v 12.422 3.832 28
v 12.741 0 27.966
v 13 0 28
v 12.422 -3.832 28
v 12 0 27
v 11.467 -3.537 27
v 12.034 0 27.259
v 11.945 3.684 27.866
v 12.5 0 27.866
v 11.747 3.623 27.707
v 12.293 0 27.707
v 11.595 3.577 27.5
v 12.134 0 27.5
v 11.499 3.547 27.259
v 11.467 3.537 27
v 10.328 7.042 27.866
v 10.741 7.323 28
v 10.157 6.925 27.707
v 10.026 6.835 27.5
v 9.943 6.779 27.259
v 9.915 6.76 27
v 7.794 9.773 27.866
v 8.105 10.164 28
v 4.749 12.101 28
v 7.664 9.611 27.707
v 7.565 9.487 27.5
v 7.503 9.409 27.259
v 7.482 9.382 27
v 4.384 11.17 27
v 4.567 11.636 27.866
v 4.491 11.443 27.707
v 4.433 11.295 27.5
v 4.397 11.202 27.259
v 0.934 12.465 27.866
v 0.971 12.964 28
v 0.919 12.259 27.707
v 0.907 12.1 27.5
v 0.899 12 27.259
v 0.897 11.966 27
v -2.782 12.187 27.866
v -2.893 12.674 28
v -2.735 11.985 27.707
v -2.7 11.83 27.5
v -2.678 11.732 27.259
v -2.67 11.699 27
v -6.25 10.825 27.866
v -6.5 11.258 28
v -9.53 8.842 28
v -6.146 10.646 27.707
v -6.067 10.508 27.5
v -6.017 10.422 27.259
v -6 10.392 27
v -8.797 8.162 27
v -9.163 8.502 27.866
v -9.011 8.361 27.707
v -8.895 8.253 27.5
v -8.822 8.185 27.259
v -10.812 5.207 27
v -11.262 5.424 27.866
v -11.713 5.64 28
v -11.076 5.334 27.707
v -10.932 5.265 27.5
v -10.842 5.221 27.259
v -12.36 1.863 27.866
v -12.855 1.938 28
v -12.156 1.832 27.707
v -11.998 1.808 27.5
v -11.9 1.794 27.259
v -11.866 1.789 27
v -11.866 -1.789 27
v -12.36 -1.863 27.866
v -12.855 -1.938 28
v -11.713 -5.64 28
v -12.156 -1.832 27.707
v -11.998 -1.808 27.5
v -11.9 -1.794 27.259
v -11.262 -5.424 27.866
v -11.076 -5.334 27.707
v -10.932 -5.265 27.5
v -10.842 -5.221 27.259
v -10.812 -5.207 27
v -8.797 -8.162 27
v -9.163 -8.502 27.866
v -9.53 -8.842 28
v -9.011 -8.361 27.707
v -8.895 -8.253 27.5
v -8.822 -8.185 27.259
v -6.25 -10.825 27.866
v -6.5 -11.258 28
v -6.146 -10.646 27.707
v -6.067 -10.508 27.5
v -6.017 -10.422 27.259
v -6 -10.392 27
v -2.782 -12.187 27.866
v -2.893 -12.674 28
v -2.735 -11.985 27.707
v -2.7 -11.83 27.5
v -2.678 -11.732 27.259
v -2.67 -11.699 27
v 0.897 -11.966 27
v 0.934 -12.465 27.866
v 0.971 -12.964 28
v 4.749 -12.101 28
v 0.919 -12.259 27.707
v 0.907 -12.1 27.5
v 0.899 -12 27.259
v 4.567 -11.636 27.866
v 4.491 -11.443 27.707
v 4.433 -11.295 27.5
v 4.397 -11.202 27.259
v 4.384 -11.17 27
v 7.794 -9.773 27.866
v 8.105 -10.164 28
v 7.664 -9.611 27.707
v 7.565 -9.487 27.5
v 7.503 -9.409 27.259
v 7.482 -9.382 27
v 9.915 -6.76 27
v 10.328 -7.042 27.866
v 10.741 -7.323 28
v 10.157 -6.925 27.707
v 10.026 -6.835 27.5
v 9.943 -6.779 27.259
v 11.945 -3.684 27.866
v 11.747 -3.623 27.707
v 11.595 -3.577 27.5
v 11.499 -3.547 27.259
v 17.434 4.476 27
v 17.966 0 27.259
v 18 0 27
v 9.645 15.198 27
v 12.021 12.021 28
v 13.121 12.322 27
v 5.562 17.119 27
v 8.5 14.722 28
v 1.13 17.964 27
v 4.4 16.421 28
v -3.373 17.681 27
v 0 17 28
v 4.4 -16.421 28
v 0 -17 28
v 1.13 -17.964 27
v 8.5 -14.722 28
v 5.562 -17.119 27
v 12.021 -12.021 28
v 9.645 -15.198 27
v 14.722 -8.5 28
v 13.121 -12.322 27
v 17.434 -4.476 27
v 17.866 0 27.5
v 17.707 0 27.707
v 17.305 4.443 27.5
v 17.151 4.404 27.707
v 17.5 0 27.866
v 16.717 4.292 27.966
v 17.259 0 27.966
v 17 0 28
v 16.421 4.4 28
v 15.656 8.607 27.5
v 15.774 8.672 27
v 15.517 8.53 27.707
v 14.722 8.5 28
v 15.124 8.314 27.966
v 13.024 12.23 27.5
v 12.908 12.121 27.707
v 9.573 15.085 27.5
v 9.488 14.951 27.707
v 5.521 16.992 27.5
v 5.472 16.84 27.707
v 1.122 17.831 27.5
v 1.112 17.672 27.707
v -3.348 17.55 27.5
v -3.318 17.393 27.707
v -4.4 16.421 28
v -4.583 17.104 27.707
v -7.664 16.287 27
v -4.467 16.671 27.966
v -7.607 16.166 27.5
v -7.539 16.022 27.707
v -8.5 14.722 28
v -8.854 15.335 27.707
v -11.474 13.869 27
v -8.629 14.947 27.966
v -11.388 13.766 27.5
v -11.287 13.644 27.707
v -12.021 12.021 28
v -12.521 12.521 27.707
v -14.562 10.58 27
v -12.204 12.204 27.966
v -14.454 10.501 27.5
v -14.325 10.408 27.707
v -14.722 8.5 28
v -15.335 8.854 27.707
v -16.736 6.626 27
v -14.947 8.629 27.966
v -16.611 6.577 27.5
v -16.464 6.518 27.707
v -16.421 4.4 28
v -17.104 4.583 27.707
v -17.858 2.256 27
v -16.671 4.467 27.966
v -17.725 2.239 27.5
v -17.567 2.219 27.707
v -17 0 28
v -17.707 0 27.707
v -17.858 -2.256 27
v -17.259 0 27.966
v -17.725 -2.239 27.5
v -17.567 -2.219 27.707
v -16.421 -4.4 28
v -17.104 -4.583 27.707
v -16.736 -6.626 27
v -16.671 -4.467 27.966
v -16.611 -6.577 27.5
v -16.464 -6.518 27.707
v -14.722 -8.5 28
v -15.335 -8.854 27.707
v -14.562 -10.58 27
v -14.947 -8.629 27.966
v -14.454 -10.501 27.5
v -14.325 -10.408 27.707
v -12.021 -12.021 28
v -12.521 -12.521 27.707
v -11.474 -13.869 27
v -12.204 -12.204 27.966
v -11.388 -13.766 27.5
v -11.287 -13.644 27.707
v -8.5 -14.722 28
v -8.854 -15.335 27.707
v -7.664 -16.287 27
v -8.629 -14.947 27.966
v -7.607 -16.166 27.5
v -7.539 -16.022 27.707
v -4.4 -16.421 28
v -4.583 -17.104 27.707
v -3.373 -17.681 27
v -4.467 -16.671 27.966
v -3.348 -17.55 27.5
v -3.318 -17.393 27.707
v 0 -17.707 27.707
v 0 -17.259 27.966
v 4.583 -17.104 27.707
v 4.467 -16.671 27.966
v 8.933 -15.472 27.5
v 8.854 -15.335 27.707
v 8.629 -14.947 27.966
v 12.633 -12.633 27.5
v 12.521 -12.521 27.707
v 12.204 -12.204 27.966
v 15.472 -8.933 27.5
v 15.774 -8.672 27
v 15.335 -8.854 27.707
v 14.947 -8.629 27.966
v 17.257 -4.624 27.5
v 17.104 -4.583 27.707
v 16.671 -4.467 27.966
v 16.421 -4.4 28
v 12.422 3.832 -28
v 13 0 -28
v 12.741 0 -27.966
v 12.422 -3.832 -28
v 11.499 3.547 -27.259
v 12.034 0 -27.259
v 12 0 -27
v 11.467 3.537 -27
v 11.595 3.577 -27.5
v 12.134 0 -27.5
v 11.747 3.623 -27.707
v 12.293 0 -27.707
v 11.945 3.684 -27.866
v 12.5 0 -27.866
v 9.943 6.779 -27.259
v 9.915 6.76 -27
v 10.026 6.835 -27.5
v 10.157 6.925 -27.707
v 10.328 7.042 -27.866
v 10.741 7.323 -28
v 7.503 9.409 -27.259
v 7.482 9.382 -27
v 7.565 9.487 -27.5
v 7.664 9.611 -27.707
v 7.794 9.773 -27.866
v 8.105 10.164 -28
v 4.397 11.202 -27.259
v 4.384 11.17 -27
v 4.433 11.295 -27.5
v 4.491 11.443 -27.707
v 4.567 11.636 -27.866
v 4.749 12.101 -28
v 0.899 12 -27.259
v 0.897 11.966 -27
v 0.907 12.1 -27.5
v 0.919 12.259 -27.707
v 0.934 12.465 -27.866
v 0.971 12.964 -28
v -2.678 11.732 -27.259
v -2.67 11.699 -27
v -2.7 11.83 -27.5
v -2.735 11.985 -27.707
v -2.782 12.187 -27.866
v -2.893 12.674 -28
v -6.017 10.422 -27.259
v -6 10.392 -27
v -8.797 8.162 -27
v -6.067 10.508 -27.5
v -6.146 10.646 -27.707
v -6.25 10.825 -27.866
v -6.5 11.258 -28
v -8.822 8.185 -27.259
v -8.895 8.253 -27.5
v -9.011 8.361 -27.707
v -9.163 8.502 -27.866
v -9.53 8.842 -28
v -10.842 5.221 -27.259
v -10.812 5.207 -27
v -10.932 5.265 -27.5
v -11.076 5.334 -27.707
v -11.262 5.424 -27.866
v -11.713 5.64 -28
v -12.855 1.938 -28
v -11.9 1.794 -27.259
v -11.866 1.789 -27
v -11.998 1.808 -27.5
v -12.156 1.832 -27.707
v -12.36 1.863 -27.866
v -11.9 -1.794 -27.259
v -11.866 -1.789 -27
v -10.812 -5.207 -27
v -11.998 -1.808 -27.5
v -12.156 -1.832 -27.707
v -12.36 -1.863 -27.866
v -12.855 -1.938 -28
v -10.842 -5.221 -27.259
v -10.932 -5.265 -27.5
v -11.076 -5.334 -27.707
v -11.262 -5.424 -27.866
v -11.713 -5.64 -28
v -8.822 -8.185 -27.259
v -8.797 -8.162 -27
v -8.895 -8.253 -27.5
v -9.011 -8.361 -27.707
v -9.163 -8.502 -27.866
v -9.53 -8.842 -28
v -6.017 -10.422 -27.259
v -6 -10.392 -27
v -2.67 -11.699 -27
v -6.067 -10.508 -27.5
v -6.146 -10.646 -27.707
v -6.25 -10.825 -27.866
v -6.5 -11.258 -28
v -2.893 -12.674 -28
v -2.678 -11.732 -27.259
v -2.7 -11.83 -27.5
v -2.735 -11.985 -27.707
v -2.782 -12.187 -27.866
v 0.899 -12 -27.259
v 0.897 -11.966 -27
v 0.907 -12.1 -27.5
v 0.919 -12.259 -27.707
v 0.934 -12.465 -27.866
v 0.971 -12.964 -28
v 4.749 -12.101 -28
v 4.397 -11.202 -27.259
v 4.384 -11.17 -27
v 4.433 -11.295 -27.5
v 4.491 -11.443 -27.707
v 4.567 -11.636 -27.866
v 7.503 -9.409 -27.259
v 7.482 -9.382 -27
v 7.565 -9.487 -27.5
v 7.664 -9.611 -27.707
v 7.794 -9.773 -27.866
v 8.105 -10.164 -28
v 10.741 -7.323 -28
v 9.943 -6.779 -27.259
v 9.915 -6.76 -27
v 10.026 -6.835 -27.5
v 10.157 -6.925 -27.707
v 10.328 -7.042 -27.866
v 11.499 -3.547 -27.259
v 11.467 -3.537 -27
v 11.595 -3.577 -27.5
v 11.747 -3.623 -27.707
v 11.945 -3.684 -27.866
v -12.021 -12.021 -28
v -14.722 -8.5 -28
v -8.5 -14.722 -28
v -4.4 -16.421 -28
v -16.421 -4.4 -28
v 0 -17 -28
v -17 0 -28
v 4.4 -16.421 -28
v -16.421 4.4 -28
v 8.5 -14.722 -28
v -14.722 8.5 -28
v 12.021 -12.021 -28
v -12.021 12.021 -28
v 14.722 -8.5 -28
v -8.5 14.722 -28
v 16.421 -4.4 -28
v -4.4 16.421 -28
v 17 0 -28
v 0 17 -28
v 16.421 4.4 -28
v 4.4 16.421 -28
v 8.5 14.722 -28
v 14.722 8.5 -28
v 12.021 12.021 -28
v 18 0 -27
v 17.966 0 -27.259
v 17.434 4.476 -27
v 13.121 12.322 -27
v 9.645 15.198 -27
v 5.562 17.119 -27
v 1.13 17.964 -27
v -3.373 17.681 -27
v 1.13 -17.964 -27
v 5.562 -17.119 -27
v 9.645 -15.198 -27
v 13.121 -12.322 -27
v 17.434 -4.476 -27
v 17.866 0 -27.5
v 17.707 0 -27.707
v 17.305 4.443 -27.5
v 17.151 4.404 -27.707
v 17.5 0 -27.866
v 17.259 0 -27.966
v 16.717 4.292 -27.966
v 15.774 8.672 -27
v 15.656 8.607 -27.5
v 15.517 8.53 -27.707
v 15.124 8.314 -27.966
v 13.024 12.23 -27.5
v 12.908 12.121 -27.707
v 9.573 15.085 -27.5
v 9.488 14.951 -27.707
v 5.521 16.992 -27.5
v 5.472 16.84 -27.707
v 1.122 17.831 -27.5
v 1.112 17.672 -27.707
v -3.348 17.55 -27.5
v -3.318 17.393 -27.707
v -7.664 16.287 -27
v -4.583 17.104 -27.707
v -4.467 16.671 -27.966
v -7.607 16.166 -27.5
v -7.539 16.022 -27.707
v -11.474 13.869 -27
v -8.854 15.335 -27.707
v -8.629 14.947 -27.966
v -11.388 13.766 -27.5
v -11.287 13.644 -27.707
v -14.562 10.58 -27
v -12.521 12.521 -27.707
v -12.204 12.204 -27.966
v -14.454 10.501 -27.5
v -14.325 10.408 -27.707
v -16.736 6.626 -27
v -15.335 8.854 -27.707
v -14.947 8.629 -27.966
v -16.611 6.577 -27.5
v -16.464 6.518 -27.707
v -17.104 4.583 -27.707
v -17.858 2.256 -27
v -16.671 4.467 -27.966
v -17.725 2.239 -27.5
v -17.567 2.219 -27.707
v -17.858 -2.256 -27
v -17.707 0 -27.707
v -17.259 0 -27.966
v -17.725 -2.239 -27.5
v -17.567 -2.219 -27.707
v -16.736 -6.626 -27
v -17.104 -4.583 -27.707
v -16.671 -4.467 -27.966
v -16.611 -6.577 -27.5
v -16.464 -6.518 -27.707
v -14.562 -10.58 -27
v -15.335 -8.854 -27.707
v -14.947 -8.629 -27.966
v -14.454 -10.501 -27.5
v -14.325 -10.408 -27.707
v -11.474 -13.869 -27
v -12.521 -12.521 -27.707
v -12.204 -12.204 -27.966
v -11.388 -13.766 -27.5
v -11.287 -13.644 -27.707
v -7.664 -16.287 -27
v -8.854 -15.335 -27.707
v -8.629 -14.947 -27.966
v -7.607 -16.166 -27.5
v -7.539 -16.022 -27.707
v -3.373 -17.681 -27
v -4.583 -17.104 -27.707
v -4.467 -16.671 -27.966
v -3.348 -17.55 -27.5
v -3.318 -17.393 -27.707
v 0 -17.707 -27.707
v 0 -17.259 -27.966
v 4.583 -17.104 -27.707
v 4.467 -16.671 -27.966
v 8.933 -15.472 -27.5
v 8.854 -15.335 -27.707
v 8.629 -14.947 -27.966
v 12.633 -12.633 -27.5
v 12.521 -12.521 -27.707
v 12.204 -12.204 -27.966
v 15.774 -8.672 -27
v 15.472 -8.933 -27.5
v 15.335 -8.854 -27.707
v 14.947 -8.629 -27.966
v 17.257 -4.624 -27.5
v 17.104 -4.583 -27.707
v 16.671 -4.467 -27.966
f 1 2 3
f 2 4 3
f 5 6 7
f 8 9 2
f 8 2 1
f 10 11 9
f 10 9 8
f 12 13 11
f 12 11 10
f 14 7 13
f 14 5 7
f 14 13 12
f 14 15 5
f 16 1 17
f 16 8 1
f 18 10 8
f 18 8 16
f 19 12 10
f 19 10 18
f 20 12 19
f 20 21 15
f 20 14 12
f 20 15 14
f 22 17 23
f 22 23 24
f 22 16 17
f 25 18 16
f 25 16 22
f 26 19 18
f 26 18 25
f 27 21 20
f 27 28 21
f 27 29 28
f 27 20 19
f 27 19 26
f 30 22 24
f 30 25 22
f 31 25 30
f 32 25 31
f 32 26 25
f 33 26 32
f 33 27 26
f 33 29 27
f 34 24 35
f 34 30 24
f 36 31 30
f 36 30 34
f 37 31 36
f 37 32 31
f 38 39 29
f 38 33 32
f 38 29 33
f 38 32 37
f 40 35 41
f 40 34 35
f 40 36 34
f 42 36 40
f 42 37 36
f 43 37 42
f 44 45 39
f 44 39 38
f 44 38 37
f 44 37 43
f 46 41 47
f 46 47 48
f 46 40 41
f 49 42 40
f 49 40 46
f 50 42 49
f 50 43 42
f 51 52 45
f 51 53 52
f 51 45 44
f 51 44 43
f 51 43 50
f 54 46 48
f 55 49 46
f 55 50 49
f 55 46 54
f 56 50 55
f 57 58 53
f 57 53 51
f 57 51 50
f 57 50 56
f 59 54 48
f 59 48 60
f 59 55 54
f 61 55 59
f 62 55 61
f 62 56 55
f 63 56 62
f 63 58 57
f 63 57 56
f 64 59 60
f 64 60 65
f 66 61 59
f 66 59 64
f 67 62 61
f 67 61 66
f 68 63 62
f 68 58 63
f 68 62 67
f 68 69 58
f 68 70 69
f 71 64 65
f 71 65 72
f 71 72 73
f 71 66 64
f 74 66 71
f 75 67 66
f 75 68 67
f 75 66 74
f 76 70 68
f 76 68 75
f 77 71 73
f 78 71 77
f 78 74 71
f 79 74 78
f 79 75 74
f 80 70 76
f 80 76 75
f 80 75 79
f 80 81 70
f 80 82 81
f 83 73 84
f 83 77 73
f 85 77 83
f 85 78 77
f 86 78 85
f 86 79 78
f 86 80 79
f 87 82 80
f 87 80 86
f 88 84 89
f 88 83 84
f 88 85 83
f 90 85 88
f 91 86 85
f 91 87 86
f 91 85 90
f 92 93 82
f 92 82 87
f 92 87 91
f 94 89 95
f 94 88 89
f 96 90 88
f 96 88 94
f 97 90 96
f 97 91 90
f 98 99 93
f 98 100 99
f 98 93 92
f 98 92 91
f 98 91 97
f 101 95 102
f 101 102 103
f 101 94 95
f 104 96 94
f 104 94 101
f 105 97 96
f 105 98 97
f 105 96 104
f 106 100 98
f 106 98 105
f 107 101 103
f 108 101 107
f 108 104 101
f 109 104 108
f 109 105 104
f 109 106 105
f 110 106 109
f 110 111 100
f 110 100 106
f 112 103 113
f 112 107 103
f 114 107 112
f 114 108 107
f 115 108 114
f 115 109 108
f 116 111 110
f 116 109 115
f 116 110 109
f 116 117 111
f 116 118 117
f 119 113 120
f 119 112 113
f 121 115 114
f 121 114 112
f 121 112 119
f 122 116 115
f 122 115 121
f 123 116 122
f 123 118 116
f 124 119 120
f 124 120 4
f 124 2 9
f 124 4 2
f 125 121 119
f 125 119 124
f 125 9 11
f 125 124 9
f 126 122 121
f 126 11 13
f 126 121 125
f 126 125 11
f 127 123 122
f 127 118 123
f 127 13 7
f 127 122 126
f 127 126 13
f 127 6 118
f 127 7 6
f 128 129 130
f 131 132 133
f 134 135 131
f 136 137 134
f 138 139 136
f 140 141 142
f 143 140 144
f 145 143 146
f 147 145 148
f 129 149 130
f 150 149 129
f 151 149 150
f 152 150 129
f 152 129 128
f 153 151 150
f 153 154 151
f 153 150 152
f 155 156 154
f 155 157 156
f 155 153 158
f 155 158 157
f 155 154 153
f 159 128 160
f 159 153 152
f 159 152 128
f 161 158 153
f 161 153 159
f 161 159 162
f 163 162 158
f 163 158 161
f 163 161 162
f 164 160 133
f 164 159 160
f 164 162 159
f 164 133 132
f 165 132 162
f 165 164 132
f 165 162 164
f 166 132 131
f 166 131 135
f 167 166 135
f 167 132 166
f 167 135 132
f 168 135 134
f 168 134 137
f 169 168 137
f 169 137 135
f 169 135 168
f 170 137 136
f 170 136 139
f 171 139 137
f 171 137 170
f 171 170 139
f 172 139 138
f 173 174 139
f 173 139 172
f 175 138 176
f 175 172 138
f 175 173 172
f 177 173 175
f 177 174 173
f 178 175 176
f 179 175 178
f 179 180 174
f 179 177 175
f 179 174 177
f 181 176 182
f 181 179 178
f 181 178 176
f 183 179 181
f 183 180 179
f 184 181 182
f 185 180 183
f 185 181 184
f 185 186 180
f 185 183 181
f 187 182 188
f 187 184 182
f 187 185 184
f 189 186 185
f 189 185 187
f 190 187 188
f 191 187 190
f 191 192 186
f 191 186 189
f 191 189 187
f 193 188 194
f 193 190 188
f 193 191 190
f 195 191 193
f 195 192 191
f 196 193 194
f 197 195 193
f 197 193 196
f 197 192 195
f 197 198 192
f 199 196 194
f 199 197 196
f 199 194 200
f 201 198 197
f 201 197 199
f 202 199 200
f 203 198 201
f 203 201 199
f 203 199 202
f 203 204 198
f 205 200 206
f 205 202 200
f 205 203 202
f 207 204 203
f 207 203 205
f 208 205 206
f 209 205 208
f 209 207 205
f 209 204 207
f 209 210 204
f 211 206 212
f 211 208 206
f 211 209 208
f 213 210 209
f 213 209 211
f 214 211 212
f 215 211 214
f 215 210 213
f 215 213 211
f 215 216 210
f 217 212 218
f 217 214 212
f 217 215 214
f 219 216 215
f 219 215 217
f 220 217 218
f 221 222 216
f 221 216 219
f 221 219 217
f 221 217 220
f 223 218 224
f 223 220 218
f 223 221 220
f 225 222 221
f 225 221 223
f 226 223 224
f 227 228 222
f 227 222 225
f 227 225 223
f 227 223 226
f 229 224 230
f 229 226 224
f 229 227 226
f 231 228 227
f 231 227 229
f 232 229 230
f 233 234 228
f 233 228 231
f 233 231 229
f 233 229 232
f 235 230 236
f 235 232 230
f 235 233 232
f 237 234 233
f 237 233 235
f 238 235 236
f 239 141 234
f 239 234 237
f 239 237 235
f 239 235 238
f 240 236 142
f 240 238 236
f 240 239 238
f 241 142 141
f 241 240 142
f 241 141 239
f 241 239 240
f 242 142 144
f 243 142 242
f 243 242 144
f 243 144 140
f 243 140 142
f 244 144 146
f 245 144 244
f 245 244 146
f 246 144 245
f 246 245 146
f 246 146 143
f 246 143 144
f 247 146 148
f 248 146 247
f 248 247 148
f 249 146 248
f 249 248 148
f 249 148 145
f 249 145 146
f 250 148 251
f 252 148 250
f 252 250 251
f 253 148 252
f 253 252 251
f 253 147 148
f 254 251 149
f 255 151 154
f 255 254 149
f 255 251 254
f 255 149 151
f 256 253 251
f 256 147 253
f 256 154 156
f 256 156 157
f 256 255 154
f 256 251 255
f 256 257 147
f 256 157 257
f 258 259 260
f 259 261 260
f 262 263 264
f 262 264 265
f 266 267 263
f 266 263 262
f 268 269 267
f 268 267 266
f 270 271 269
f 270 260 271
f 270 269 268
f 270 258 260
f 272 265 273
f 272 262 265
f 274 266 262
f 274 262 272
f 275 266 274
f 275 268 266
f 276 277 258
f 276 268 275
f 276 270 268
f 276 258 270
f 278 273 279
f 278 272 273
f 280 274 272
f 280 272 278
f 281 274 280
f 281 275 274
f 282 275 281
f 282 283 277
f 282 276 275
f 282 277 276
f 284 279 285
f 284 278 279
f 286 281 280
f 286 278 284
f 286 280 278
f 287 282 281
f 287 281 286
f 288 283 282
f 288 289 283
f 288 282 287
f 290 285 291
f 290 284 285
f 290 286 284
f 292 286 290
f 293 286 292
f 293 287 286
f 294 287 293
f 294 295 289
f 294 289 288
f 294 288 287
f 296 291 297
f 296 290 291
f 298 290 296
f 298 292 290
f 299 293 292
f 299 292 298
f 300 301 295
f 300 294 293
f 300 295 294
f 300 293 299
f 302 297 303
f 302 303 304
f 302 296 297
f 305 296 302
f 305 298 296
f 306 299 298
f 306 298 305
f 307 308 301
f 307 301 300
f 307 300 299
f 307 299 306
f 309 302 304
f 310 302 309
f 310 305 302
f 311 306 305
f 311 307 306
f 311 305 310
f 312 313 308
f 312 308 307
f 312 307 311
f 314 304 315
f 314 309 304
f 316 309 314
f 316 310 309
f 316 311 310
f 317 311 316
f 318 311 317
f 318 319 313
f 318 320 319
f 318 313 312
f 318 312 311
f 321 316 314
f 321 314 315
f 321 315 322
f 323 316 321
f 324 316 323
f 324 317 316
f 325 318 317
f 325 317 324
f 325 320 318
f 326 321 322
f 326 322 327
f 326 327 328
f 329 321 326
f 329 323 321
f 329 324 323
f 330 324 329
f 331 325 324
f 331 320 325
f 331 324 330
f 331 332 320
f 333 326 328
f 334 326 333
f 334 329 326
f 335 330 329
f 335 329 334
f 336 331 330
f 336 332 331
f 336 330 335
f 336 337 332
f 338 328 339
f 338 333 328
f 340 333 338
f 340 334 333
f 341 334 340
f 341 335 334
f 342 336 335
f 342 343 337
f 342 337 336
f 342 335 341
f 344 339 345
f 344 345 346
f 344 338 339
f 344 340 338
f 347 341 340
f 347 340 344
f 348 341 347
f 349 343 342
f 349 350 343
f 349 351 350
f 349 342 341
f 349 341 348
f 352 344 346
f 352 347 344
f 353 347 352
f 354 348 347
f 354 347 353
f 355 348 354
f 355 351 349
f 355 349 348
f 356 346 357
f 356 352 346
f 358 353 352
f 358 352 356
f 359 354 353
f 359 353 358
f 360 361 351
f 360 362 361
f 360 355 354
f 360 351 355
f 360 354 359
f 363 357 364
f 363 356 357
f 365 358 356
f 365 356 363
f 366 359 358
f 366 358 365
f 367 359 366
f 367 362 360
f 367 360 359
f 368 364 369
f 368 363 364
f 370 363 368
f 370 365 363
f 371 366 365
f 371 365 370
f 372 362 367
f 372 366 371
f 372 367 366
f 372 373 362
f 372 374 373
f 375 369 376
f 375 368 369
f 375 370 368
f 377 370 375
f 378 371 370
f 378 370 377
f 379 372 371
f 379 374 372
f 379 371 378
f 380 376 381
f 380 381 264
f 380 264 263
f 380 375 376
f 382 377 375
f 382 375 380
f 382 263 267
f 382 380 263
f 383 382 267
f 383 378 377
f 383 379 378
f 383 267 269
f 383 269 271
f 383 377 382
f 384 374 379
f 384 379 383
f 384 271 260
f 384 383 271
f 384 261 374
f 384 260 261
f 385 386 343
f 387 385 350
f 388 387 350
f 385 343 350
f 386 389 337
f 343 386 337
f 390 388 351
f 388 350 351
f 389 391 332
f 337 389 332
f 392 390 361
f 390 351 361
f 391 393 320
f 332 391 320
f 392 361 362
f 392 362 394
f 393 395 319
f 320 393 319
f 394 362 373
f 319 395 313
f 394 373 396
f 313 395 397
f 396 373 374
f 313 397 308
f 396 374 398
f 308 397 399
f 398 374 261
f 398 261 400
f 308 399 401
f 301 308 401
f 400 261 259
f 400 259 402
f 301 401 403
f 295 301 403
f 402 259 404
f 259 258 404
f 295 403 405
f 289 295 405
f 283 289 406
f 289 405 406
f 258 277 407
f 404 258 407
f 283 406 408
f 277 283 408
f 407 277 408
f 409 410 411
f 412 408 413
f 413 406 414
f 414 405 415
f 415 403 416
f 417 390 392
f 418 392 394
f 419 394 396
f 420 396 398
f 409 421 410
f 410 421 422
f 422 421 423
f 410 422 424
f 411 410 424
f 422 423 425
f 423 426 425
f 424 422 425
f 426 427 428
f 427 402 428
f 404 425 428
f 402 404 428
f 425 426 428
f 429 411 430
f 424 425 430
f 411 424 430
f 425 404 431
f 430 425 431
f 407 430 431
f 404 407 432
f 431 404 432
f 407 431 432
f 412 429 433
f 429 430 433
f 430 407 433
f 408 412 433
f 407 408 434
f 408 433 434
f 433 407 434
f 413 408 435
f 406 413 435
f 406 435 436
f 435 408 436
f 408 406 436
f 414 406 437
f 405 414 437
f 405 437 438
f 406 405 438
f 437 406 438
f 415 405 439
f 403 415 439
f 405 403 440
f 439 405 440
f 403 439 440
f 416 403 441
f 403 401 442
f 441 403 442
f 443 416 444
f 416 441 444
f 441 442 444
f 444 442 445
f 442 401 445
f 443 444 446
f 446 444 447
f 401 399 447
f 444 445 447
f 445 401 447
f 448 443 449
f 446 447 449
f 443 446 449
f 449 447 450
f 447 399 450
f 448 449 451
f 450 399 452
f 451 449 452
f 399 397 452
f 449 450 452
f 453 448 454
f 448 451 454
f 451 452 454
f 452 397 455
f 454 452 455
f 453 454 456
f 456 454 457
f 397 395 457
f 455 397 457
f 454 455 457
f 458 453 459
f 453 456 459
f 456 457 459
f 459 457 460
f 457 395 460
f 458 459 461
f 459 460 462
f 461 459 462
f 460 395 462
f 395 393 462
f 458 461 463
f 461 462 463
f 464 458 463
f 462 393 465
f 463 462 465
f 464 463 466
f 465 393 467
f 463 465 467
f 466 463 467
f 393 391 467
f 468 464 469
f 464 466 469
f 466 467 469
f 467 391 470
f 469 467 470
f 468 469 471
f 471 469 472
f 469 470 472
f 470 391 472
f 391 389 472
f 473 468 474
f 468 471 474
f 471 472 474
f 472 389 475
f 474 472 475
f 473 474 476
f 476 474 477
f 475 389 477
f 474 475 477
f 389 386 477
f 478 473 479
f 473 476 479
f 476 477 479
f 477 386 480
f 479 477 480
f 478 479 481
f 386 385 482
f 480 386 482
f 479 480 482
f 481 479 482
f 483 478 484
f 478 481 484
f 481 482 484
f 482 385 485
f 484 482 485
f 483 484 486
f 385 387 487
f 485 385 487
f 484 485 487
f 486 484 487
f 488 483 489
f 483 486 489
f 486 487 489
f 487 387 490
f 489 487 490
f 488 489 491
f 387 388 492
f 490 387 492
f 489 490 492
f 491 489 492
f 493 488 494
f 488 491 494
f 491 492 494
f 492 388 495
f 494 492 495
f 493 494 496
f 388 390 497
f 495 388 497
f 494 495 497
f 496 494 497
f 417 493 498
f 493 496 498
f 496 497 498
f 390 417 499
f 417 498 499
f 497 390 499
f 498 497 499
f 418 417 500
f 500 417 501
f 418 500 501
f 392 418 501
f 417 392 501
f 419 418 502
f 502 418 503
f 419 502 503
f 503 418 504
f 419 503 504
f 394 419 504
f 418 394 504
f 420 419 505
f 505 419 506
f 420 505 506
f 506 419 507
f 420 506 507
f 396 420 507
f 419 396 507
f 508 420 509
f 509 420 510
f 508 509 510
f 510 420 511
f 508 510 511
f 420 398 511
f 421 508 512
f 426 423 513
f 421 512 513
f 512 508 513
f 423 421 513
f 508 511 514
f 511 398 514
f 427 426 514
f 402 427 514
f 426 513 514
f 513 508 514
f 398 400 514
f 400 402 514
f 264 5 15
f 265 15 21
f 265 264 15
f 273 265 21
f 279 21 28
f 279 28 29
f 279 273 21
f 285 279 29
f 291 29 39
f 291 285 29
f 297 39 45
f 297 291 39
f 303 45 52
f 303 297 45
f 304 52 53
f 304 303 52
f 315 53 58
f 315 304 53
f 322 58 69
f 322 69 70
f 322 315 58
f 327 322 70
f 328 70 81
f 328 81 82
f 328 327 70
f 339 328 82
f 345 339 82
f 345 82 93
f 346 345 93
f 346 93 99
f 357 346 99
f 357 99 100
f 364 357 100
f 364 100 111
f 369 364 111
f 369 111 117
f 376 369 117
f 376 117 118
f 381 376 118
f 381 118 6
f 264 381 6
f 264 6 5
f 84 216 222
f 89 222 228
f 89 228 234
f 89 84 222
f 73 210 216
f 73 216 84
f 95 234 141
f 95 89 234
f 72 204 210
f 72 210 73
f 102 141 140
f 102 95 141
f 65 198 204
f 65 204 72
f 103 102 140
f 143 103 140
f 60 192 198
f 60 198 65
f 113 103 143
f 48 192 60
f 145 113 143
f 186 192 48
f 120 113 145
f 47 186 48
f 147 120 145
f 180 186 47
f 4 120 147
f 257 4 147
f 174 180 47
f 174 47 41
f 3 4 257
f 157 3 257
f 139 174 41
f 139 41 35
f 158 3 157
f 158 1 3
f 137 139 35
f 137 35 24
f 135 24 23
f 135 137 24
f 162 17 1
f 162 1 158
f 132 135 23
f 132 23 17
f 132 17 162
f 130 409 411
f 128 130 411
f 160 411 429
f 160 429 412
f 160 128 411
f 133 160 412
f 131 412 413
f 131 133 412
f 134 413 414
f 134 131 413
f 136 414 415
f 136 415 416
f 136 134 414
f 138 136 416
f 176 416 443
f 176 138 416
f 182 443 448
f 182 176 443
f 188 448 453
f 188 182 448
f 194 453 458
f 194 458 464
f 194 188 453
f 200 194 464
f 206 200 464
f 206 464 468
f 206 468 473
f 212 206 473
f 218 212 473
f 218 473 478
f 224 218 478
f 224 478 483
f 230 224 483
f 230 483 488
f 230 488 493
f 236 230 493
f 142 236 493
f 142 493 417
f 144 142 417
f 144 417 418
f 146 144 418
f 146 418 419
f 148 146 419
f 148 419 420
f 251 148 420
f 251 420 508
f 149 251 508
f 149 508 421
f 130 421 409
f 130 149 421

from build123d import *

# Parameters (mm, degrees)
SKETCH_1_R      = 18
SKETCH_1_R_2    = 12
EXTRUDE_1_DEPTH = 28
FILLET_1_R      = 1


with BuildPart() as part:
    # Эскиз1 → Бобышка-Вытянуть1 (new, symmetric)
    with BuildSketch(Plane.XY):
        Circle(SKETCH_1_R)
        Circle(SKETCH_1_R_2, mode=Mode.SUBTRACT)
    extrude(amount=EXTRUDE_1_DEPTH, both=True)

    # Скругление1
    fillet_1_edges = [part.edges().sort_by_distance(p)[0] for p in [
        (-18, 0, -28),
        (-18, 0, 28),
        (-12, 0, -28),
        (-12, 0, 28),
    ]]
    fillet(fillet_1_edges, radius=FILLET_1_R)


solid = part.part
